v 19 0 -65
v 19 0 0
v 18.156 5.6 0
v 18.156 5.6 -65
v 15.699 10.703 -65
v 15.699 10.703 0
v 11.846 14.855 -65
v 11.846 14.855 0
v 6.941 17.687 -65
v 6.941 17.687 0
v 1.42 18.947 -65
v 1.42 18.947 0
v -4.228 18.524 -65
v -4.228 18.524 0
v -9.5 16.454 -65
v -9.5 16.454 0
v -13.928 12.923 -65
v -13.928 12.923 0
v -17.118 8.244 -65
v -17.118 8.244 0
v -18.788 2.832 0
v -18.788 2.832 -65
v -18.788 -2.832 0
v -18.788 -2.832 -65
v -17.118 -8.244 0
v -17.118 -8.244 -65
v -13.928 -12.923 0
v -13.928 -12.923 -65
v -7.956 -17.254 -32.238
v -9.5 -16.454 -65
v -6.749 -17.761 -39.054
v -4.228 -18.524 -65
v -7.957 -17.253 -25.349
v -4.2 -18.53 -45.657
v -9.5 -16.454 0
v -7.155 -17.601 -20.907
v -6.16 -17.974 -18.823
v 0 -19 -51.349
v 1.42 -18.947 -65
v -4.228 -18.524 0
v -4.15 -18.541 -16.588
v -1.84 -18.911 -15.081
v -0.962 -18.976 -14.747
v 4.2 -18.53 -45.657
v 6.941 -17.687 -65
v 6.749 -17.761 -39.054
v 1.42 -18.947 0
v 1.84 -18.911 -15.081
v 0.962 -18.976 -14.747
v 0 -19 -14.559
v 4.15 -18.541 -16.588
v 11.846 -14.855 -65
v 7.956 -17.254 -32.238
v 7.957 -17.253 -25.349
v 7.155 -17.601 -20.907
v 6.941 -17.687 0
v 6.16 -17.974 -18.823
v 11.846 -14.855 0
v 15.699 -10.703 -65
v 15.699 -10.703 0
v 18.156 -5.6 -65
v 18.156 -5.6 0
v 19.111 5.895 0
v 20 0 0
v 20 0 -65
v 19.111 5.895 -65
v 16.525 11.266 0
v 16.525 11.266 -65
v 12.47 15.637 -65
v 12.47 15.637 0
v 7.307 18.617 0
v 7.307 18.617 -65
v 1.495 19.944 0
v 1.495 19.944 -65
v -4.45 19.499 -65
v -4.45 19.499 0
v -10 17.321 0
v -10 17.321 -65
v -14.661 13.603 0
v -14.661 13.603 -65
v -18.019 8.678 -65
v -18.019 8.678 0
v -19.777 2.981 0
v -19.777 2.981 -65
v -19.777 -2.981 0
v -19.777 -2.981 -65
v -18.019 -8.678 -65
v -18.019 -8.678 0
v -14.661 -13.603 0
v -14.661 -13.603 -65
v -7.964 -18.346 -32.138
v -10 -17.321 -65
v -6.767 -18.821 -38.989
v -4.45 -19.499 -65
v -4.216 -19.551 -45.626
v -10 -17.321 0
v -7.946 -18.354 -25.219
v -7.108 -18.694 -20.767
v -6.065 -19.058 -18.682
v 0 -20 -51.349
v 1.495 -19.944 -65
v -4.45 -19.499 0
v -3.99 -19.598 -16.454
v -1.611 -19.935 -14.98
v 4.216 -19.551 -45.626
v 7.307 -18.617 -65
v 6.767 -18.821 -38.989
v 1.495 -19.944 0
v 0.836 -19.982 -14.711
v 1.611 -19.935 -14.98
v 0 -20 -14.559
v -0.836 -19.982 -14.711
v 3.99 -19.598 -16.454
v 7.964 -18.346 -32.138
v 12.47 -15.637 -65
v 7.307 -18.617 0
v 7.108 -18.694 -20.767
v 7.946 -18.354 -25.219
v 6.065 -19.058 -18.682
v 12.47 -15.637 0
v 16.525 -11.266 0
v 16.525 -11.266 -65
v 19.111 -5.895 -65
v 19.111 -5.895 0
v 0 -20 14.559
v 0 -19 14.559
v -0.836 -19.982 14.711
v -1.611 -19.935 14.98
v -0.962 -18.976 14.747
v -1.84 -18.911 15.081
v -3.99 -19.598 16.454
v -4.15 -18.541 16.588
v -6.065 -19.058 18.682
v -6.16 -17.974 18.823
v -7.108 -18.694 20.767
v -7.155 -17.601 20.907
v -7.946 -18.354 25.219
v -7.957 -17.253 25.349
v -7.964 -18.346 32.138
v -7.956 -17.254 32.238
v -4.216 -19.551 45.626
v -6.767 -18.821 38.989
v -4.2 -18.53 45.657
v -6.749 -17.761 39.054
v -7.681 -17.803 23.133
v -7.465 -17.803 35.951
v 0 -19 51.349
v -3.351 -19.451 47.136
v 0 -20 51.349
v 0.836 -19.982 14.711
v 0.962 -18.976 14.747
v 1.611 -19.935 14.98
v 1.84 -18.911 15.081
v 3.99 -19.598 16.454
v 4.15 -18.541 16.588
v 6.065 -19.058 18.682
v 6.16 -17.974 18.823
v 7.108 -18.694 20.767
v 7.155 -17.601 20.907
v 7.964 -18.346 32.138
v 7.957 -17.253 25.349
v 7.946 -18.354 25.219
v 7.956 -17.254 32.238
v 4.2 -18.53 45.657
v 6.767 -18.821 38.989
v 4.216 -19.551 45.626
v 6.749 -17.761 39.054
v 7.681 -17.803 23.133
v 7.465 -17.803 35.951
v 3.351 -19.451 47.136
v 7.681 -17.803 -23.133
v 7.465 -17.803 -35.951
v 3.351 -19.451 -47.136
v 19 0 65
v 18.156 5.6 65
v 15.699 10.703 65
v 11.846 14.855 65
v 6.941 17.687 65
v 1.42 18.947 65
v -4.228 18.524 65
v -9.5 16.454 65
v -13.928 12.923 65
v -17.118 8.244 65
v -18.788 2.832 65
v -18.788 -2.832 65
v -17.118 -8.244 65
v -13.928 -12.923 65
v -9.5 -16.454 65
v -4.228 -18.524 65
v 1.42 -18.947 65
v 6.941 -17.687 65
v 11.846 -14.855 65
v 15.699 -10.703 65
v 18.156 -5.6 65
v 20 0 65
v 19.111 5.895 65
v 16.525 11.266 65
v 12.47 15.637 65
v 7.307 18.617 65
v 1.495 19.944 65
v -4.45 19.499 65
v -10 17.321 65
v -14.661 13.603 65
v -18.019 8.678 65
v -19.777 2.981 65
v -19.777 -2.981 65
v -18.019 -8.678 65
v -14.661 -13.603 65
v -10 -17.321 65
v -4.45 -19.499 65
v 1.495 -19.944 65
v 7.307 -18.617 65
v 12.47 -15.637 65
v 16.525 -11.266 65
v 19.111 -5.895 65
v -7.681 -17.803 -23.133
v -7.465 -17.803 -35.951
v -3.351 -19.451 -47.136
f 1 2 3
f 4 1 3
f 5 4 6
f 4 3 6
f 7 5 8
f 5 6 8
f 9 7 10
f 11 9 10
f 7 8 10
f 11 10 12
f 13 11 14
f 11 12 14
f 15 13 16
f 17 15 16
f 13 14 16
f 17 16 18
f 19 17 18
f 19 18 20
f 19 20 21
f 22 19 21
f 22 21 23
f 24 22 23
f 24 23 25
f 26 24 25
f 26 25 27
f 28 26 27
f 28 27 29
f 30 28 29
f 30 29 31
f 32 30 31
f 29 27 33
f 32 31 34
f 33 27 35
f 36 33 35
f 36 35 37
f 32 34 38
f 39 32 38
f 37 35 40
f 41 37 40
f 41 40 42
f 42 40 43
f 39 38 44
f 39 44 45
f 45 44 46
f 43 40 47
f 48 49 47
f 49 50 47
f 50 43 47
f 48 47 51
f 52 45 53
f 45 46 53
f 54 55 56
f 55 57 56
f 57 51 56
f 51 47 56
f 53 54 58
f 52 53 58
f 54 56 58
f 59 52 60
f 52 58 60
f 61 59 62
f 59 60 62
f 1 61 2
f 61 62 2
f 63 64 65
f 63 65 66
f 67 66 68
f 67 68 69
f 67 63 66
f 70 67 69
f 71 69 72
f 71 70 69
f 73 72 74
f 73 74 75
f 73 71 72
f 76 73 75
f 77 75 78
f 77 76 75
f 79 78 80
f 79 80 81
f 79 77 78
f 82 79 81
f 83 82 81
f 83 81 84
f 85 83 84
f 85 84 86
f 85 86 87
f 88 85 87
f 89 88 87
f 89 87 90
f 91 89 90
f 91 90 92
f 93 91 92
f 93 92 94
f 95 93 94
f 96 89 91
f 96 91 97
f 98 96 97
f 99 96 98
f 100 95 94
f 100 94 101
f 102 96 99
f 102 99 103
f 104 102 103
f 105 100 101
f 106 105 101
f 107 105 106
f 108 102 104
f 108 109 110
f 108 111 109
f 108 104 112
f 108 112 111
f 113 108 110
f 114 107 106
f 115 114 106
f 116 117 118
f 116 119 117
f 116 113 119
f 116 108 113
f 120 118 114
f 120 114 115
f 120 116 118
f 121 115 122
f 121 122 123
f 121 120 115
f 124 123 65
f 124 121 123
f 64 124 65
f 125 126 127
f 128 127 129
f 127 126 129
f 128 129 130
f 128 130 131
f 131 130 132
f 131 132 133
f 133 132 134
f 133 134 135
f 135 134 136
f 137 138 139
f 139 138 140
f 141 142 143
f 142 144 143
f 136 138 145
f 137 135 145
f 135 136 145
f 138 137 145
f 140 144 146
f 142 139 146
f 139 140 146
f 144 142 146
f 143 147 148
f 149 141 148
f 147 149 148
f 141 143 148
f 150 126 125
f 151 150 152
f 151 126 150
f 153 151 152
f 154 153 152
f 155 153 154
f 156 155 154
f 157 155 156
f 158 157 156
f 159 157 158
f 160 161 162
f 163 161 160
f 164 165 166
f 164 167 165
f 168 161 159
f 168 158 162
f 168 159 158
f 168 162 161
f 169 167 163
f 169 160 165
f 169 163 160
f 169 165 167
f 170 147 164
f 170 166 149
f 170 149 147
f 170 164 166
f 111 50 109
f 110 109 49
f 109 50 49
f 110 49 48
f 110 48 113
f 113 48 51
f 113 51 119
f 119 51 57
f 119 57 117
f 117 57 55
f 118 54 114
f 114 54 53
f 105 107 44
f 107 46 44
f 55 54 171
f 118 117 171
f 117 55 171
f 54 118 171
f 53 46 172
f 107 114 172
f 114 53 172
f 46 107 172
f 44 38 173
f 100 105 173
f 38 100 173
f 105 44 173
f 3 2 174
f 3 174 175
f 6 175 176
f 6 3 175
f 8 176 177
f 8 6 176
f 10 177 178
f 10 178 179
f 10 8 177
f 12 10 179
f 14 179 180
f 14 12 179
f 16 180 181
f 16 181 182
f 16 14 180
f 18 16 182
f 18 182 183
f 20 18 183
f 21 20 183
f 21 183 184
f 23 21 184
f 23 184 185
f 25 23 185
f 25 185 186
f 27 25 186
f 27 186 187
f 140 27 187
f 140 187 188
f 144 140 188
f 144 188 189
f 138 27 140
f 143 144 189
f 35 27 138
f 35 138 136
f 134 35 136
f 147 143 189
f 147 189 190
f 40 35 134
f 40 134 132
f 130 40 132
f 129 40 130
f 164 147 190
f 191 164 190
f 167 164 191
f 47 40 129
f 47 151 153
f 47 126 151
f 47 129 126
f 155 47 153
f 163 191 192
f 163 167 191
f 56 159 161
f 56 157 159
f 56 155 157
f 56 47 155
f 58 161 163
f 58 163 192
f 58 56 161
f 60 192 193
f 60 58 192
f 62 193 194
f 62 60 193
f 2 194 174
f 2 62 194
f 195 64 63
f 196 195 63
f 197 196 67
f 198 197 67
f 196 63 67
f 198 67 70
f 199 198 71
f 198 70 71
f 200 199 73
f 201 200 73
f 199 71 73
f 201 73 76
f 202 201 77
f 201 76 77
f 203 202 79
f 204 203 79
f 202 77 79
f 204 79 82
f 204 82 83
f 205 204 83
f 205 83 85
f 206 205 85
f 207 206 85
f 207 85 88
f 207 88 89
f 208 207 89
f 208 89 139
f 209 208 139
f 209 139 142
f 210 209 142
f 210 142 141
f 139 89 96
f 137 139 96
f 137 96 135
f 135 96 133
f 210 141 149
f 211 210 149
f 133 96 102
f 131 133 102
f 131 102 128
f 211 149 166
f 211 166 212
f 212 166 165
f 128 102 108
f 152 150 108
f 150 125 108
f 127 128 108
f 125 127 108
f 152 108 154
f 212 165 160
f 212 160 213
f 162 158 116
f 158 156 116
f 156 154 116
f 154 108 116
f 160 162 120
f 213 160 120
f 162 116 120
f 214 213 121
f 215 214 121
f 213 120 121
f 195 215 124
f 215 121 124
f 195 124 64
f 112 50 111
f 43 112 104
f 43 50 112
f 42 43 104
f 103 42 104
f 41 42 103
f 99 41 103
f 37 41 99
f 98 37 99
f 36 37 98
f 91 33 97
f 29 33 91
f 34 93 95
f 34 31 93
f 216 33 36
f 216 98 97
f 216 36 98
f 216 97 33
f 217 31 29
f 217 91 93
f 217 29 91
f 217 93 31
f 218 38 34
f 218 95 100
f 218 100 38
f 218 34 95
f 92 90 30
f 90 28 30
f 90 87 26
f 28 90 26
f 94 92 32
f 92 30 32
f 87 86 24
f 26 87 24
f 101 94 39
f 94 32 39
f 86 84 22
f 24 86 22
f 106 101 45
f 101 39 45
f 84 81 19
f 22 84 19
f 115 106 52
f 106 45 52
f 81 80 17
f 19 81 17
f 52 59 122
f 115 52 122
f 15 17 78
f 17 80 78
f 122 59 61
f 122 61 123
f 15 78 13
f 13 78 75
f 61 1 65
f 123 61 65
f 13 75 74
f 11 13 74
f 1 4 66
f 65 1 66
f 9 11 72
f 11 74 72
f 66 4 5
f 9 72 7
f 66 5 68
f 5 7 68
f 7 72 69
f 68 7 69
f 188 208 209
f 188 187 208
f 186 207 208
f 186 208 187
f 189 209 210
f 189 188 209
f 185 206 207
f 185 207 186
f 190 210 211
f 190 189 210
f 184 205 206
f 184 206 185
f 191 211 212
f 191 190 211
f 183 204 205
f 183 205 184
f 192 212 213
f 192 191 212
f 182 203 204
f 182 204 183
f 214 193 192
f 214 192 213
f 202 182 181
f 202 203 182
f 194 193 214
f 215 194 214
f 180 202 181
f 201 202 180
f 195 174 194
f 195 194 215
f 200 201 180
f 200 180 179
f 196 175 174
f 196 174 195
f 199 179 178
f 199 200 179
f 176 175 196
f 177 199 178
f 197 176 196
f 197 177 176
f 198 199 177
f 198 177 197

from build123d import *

# Parameters (mm, degrees)
F0_R     = 20
F0_R_2   = 19
F1_DEPTH = 65
F3_DEPTH = 41.1


with BuildPart() as f1:
    # F0 (on Top) → F1 (new body)
    with BuildSketch(Plane.XY):
        Circle(F0_R)
        Circle(F0_R_2, mode=Mode.SUBTRACT)
    extrude(amount=F1_DEPTH)

    # F2 (on Front) → F3 (cut)
    with BuildSketch(Plane.XZ):
        with BuildLine():
            add(Edge.make_bspline(
                [(0, 14.5592805974), (-1.9073922383, 14.7213677243), (-6.1064946547, 17.7360926743), (-8.1839165851, 23.2066328676), (-8.391246048, 36.0351621809), (-3.8296298891, 47.432605238), (-1.2185013376, 49.7799145352), (0, 51.348935332)],
                knots=[0, 0, 0, 0, 0.1765278414, 0.3445091773, 0.5954474838, 0.8373921793, 1, 1, 1, 1], degree=3))
            add(Edge.make_bspline(
                [(0, 14.5592805974), (1.9073922383, 14.7213677243), (6.1064946547, 17.7360926743), (8.1839165851, 23.2066328676), (8.391246048, 36.0351621809), (3.8296298891, 47.432605238), (1.2185013376, 49.7799145352), (0, 51.348935332)],
                knots=[0, 0, 0, 0, 0.1765278414, 0.3445091773, 0.5954474838, 0.8373921793, 1, 1, 1, 1], degree=3))
        make_face()
    extrude(amount=F3_DEPTH, mode=Mode.SUBTRACT)

    # F4: F1 across plane


with BuildPart() as f1_1:
    add(f1.part)
    add(f1.part.mirror(Plane.XY))


solid = f1_1.part
